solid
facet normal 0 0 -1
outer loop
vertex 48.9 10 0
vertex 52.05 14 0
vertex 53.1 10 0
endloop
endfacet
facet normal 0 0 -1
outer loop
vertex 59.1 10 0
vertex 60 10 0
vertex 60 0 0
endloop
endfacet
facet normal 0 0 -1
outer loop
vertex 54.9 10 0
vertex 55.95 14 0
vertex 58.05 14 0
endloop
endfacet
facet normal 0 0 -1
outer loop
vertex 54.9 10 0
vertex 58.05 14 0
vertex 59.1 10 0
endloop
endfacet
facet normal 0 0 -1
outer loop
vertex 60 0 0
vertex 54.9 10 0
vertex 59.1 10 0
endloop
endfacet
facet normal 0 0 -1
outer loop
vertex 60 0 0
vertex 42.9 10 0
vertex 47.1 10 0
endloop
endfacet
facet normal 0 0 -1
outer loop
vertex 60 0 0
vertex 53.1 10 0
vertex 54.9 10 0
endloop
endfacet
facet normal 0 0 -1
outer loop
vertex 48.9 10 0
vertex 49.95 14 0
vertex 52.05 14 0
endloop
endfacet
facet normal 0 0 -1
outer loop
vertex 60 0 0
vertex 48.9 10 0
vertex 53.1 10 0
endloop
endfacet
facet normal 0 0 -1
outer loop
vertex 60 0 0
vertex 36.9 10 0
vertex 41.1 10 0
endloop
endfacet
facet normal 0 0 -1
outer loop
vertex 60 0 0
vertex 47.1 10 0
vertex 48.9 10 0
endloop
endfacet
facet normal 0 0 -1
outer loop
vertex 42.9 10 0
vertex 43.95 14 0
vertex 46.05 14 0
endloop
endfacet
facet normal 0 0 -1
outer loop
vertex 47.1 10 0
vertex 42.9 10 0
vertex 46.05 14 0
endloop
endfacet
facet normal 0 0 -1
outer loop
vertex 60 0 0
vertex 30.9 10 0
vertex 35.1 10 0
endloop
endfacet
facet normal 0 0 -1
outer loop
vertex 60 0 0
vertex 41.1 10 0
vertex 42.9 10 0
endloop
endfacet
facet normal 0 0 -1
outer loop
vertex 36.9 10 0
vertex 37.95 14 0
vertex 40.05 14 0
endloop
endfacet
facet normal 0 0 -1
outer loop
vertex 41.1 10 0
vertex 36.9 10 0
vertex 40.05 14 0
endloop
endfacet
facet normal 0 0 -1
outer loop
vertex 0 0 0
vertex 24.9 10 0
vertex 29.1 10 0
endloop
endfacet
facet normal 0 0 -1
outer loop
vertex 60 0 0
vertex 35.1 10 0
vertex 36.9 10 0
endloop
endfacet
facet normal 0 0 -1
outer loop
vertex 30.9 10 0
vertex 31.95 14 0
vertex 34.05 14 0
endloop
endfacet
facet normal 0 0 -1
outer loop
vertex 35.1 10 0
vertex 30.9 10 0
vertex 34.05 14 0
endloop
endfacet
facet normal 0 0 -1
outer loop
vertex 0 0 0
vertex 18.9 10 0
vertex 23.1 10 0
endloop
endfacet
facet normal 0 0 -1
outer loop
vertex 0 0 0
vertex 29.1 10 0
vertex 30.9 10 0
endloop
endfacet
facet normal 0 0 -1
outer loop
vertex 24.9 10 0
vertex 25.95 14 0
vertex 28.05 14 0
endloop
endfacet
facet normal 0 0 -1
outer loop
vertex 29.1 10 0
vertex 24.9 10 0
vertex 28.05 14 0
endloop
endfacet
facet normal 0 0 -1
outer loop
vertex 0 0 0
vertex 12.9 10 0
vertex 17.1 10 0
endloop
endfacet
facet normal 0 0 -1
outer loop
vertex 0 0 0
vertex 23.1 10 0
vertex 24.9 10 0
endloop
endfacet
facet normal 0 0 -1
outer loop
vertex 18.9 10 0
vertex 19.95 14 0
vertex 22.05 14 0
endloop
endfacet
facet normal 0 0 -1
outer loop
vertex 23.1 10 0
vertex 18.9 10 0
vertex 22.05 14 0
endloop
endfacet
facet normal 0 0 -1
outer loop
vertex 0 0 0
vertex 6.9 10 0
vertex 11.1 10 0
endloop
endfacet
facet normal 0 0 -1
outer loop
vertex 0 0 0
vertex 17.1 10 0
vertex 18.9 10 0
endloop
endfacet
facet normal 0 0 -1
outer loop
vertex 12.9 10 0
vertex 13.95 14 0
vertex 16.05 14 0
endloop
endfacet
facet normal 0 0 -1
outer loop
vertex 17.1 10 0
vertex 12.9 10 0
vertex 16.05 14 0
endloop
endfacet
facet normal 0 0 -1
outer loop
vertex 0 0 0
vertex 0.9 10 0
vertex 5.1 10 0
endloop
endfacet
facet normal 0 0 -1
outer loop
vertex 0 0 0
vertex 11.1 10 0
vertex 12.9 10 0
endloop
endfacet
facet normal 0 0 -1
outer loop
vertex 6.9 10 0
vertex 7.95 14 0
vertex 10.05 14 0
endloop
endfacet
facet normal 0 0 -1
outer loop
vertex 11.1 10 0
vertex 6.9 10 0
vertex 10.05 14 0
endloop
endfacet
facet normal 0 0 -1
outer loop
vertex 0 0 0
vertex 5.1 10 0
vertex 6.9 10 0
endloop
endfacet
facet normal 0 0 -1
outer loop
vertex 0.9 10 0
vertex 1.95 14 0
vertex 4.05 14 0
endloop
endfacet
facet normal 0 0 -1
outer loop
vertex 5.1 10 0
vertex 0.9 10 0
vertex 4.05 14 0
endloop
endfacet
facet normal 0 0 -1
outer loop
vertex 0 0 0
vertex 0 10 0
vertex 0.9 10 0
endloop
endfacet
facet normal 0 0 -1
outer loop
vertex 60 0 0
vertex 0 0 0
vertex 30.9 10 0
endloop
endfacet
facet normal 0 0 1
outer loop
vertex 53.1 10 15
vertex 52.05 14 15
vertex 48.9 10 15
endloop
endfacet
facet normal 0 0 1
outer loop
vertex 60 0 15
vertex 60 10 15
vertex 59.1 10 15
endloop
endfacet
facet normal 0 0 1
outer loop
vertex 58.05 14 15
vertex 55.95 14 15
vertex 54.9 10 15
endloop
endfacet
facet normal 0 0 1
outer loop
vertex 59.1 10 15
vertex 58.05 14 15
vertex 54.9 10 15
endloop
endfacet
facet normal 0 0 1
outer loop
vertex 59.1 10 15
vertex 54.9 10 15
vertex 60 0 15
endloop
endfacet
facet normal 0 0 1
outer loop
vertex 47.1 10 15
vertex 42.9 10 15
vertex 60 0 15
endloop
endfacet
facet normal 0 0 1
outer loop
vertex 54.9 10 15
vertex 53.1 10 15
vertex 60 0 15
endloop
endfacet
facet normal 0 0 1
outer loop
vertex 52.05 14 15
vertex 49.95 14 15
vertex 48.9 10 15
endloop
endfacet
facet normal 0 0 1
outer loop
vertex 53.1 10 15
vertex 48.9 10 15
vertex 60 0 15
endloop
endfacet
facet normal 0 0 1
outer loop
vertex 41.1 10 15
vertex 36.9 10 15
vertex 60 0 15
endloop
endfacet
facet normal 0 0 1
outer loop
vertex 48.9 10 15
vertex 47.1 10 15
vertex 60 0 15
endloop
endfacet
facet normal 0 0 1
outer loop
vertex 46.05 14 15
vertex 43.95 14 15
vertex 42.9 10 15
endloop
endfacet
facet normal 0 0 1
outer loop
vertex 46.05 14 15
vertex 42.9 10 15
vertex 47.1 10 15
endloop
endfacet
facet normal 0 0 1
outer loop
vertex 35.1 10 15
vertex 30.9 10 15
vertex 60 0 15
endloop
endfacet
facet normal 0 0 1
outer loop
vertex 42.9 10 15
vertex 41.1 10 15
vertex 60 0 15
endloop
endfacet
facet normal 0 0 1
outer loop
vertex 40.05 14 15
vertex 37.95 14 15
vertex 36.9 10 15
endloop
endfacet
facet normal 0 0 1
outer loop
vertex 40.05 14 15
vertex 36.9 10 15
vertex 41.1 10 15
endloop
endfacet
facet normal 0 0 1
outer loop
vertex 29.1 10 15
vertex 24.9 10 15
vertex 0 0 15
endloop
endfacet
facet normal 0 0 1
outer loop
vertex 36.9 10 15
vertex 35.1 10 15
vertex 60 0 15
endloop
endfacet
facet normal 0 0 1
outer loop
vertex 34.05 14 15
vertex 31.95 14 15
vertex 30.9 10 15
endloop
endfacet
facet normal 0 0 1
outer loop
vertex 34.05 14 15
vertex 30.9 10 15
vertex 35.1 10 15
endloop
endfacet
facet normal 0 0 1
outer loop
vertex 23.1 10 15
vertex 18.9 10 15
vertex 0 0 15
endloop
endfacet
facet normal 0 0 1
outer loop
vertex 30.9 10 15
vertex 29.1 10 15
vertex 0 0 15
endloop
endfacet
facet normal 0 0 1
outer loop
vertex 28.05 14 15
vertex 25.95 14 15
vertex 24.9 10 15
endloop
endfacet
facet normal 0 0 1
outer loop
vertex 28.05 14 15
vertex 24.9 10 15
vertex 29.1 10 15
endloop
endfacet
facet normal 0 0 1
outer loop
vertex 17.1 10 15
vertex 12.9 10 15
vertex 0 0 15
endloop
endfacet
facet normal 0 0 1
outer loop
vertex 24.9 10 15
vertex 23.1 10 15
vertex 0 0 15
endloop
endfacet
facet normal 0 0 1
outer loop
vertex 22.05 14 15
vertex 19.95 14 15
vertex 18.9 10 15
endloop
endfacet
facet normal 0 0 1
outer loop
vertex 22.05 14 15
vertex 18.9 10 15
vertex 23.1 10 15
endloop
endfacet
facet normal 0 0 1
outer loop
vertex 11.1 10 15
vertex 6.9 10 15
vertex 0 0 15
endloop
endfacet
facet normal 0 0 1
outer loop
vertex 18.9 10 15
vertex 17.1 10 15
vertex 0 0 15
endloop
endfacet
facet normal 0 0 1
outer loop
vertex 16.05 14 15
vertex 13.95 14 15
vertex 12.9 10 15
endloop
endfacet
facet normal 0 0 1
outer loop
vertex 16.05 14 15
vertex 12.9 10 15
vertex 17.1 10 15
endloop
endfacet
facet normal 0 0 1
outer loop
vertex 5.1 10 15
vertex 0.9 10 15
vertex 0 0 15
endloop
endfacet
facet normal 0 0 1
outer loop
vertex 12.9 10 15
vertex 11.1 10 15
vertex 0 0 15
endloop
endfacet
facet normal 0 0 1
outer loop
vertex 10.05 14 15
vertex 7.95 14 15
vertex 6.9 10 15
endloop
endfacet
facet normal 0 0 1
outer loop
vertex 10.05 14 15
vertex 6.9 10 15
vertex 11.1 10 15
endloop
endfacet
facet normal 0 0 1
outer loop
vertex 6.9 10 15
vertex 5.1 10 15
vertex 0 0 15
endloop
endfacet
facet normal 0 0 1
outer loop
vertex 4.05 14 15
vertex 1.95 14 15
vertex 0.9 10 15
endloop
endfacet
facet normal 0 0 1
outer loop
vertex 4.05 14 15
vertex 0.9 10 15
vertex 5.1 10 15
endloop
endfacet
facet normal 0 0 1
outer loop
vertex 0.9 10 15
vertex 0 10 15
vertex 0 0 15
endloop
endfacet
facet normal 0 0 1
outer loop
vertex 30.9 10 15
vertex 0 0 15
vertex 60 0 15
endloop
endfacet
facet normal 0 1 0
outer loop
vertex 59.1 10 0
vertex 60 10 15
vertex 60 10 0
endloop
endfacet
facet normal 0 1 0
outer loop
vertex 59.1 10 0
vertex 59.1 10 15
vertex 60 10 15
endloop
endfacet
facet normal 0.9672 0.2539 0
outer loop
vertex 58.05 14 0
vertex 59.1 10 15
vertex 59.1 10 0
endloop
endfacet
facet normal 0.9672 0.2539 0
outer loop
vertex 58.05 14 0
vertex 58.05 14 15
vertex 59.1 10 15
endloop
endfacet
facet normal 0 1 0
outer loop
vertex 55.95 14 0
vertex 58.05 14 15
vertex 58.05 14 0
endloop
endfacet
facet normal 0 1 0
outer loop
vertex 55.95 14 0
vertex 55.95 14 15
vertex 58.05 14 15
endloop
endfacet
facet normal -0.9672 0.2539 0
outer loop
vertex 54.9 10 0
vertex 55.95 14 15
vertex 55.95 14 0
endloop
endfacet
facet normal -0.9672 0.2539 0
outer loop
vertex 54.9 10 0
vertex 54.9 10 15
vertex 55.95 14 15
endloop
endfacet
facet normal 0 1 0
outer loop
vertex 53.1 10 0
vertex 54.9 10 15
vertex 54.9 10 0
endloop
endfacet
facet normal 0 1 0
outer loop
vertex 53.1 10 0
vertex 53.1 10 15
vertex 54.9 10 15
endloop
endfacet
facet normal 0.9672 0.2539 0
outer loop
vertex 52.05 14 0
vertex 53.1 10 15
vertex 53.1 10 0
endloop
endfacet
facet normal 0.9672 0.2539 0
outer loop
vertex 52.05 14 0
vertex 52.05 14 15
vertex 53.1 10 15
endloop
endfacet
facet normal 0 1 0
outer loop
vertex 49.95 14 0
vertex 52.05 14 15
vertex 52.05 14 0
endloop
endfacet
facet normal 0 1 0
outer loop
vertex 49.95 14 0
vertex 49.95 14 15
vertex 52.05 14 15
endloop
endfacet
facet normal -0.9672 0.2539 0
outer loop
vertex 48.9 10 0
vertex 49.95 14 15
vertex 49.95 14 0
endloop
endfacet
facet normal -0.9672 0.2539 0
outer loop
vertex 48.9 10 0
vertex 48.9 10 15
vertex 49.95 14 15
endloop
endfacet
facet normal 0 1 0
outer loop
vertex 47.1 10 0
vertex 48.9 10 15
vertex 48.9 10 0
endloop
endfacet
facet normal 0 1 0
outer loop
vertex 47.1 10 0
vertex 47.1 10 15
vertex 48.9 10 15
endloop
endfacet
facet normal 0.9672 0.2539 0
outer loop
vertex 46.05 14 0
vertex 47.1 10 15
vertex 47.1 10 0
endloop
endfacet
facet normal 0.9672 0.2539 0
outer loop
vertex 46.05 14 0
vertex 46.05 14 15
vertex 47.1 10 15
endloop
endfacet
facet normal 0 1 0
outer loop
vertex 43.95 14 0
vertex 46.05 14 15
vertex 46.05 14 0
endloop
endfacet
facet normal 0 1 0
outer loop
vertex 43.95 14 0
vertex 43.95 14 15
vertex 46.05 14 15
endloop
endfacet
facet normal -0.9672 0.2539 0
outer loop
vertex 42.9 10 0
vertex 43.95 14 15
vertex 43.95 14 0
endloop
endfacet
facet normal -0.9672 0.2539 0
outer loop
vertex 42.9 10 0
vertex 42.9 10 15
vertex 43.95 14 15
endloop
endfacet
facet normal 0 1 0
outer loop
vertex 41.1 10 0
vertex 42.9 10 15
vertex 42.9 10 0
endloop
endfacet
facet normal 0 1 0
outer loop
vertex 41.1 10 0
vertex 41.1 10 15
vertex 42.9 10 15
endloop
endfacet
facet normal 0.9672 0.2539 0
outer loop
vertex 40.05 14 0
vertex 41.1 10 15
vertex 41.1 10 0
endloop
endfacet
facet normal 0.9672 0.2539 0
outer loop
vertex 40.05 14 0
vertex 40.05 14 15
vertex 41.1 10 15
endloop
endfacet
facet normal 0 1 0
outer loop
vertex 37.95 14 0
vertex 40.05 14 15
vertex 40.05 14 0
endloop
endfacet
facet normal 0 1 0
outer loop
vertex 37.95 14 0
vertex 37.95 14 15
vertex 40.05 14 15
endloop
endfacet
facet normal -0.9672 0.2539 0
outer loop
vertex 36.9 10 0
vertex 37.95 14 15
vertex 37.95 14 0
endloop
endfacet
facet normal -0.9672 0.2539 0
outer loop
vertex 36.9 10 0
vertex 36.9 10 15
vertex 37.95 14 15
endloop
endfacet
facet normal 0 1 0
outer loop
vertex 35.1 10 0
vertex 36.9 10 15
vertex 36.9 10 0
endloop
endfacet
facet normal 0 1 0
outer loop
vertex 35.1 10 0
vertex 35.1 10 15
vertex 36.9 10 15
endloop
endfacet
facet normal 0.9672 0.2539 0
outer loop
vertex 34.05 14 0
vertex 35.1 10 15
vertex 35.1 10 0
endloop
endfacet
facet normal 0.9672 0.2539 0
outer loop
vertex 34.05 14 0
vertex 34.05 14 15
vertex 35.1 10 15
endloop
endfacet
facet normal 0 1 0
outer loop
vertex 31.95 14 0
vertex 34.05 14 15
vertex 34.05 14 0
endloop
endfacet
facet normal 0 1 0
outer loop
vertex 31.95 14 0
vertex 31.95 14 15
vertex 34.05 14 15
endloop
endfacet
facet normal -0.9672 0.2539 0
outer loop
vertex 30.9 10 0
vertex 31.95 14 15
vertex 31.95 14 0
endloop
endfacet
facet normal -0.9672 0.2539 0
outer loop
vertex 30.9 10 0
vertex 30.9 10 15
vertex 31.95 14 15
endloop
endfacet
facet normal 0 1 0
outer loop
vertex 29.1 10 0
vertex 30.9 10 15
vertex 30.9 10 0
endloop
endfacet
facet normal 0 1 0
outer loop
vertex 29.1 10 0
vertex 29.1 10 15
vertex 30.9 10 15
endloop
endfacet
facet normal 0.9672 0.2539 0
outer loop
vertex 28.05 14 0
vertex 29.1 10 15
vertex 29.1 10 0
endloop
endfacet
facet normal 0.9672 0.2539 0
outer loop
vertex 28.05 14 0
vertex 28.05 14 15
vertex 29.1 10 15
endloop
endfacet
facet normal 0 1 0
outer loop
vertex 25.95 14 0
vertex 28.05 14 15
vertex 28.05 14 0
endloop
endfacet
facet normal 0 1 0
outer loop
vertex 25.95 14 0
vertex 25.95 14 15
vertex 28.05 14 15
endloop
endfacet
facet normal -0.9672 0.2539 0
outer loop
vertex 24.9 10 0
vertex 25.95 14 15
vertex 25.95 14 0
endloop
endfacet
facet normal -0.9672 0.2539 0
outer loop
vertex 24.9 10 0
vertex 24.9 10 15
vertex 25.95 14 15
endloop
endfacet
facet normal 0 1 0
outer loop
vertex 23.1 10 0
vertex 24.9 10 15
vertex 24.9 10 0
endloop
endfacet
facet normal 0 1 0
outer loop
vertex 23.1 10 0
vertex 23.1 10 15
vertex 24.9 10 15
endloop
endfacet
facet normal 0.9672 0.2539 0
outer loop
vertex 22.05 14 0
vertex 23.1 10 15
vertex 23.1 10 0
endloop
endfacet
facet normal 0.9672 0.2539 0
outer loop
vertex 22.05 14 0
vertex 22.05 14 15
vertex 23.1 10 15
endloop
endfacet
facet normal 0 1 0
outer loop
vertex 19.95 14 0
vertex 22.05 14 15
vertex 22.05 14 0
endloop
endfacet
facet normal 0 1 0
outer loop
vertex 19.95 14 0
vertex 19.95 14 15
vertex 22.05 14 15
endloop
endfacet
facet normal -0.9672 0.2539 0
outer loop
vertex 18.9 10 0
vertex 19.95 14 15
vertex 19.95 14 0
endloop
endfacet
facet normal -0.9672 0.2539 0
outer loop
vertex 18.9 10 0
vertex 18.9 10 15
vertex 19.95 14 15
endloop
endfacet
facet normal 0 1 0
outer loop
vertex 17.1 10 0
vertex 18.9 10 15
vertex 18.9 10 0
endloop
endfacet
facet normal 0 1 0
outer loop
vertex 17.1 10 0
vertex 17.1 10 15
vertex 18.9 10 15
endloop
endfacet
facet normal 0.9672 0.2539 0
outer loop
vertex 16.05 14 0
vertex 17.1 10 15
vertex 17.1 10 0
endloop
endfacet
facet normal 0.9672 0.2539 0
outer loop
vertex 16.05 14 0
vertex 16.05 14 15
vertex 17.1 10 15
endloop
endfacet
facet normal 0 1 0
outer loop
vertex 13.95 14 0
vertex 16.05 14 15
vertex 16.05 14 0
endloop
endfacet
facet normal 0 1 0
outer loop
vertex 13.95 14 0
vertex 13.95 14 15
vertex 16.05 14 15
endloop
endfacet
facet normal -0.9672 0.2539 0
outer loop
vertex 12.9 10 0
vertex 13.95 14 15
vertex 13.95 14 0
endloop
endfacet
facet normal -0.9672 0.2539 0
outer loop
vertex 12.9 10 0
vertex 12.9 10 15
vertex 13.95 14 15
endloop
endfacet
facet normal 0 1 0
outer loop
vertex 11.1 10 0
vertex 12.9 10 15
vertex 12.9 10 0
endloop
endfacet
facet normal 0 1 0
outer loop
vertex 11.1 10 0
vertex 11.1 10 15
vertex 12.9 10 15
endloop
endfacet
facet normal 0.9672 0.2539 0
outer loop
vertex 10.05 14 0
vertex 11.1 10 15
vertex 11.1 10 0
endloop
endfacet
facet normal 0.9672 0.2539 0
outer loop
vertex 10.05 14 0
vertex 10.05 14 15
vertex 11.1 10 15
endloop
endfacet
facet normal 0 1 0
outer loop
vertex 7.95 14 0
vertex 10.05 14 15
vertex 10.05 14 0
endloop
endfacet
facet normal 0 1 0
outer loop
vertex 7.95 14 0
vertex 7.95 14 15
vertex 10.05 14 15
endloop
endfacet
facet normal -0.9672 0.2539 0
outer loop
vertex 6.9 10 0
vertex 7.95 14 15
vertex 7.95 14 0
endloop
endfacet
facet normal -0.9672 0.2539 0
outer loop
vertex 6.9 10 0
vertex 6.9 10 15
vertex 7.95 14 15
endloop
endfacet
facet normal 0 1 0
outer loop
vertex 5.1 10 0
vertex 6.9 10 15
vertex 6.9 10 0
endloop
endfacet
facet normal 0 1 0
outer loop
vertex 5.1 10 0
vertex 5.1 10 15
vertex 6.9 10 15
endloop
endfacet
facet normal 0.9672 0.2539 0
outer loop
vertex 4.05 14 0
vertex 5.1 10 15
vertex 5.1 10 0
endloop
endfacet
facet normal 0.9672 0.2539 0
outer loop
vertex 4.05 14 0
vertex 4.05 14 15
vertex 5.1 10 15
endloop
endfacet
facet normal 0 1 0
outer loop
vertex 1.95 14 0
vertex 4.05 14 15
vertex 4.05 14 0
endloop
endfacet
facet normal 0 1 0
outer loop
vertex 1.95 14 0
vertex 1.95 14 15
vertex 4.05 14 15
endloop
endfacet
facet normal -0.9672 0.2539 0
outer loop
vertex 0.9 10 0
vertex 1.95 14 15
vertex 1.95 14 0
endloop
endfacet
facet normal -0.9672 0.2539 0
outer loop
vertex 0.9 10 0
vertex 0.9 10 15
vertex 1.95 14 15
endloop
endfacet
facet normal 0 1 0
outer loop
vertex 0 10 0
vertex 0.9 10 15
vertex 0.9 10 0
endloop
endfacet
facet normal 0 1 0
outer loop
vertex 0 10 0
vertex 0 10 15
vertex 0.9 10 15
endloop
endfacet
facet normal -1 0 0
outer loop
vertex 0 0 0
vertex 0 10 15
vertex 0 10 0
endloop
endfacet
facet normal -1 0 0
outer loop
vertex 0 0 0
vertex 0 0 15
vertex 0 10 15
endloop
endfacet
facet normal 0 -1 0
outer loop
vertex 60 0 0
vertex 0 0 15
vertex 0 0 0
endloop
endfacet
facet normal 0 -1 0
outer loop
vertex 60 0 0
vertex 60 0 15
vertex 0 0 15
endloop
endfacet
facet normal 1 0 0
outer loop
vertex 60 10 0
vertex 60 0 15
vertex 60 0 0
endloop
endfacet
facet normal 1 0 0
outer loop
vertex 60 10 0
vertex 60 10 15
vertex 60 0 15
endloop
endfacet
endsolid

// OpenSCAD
$fn = 32;

// ----------------------------------------------------------------------
// Gear rack: 10 teeth, pitch 6 mm
// ----------------------------------------------------------------------

// --- parameters (mm) ---
teeth = 10;               // number of teeth
pitch = 6;                // tooth pitch, X
root_w = 4.2;             // tooth width at the root
tip_w = 2.1;              // tooth width at the tip
base_h = 10;              // rack body height, Y
tooth_h = 4;              // tooth height above the body
plate_t = 15;             // rack width, Z (extrusion height)
fit_tol = 0.05;           // declared fit tolerance (prompt contract)
free_tol = 0.3;           // declared free tolerance (prompt contract)

rack_l = teeth * pitch;  // overall length
total_h = base_h + tooth_h;  // overall height

profile = [[0, 0], [60, 0], [60, 10], [59.1, 10], [58.05, 14], [55.95, 14], [54.9, 10], [53.1, 10], [52.05, 14], [49.95, 14], [48.9, 10], [47.1, 10], [46.05, 14], [43.95, 14], [42.9, 10], [41.1, 10], [40.05, 14], [37.95, 14], [36.9, 10], [35.1, 10], [34.05, 14], [31.95, 14], [30.9, 10], [29.1, 10], [28.05, 14], [25.95, 14], [24.9, 10], [23.1, 10], [22.05, 14], [19.95, 14], [18.9, 10], [17.1, 10], [16.05, 14], [13.95, 14], [12.9, 10], [11.1, 10], [10.05, 14], [7.95, 14], [6.9, 10], [5.1, 10], [4.05, 14], [1.95, 14], [0.9, 10], [0, 10]];  // primary outline, 44 points, counter clockwise

// --- the one profile operation ---
linear_extrude(height = plate_t) polygon(points = profile);
